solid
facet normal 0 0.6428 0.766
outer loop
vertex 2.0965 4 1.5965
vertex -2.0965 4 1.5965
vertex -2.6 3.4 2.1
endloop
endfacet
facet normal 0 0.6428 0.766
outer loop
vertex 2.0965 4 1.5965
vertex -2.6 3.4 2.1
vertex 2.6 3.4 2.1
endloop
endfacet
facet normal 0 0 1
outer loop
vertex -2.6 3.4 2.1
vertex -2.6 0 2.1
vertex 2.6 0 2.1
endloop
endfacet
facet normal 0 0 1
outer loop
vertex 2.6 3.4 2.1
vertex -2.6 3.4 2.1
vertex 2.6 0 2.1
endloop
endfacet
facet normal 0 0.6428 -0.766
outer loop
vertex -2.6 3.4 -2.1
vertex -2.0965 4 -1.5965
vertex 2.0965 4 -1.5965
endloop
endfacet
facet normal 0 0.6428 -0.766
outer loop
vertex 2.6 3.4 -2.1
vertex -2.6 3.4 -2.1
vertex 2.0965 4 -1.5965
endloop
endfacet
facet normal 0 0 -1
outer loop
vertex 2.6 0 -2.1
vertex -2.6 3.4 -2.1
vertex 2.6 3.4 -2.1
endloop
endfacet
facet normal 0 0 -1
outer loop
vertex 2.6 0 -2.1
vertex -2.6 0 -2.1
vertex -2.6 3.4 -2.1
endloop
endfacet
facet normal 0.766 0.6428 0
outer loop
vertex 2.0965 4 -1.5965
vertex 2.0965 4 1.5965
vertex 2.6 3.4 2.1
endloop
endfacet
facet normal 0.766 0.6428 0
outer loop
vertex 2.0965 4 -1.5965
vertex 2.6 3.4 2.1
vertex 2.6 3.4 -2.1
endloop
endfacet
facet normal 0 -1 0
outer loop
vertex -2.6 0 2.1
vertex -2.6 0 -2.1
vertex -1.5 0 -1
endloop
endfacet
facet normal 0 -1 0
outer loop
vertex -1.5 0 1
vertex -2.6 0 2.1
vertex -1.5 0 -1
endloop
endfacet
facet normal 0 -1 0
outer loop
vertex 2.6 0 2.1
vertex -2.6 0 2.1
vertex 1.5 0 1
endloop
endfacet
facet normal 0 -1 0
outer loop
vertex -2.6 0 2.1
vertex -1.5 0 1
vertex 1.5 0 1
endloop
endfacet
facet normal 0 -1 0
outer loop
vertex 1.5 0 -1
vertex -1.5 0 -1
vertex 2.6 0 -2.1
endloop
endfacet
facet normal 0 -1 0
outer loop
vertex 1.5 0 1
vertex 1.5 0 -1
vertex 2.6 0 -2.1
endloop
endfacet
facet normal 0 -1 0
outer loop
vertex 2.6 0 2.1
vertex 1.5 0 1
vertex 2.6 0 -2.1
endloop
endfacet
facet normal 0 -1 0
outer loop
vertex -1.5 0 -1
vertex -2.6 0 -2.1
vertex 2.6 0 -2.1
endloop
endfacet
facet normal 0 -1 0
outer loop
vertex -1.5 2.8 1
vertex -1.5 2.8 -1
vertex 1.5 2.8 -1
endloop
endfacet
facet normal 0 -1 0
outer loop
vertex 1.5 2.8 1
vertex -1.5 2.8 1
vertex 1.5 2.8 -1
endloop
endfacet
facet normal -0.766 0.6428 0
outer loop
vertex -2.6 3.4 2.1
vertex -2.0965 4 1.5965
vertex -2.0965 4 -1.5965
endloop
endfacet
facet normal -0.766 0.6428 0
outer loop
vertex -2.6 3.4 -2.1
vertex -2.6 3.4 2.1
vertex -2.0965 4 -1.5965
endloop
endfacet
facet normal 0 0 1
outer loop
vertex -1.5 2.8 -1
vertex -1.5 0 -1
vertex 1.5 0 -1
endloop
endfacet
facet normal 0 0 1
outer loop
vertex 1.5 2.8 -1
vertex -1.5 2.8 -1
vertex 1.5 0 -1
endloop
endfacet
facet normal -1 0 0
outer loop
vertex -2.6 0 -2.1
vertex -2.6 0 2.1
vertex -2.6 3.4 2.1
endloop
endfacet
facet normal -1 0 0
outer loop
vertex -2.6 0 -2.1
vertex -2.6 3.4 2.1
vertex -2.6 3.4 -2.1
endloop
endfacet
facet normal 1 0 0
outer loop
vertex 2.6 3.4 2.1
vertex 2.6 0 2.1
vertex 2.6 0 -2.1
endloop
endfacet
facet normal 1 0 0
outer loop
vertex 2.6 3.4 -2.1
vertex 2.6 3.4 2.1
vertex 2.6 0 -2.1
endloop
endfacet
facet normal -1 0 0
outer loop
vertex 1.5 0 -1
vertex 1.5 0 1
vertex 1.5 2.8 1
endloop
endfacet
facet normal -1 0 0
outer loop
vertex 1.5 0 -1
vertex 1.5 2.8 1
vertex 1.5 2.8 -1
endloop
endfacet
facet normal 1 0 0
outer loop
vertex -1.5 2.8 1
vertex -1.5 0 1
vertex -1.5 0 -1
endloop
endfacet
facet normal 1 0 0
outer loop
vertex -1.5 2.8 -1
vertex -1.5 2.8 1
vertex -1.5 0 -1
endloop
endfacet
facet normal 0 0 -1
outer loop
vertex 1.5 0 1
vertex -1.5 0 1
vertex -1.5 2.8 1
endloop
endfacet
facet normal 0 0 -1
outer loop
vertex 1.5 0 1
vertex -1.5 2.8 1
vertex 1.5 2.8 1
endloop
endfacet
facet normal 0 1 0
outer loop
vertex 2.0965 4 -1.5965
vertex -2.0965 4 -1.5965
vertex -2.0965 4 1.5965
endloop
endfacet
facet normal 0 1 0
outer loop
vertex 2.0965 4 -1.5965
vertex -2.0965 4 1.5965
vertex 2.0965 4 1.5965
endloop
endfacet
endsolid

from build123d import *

# Parameters (mm, degrees)
SKETCH1_W                = 5.2
SKETCH1_H                = 4.2
SKETCH1_W_2              = 3
SKETCH1_H_2              = 2
BODY_EXTRUDE_DEPTH       = 2.8
SKETCH2_W                = 5.2
SKETCH2_H                = 4.2
CAP_EXTRUDE_DEPTH        = 1.2
BED_CHAMFER_SIZE         = 0.6
BED_CHAMFER_SIZE2        = 0.503459779
BED_CHAMFER_PART_2_SIZE  = 0.6
BED_CHAMFER_PART_2_SIZE2 = 0.503459779
BED_CHAMFER_PART_3_SIZE  = 0.6
BED_CHAMFER_PART_3_SIZE2 = 0.503459779
BED_CHAMFER_PART_4_SIZE  = 0.6
BED_CHAMFER_PART_4_SIZE2 = 0.503459779


with BuildPart() as part:
    # Sketch1 → Body Extrude (new body)
    with BuildSketch(Plane(origin=(0, 0, 0), x_dir=(1, 0, 0), z_dir=(0, 1, 0))):
        Rectangle(SKETCH1_W, SKETCH1_H)
        Rectangle(SKETCH1_W_2, SKETCH1_H_2, mode=Mode.SUBTRACT)
    extrude(amount=BODY_EXTRUDE_DEPTH)

    # Sketch2 → Cap Extrude (add)
    with BuildSketch(Plane(origin=(0, 2.8, 0), x_dir=(1, 0, 0), z_dir=(0, 1, 0))):
        Rectangle(SKETCH2_W, SKETCH2_H)
    extrude(amount=CAP_EXTRUDE_DEPTH)

    # Bed Chamfer
    bed_chamfer_edges = [part.edges().sort_by_distance(p)[0] for p in [
        (-2.6, 4, 0),
    ]]
    bed_chamfer_side = [part.faces().sort_by_distance(p)[0] for p in [
        (-2.6, 2, 0),
    ]]
    chamfer(bed_chamfer_edges, length=BED_CHAMFER_SIZE, length2=BED_CHAMFER_SIZE2, reference=bed_chamfer_side[0])

    # Bed Chamfer part 2
    bed_chamfer_part_2_edges = [part.edges().sort_by_distance(p)[0] for p in [
        (0, 4, 2.1),
    ]]
    bed_chamfer_part_2_side = [part.faces().sort_by_distance(p)[0] for p in [
        (0, 2, 2.1),
    ]]
    chamfer(bed_chamfer_part_2_edges, length=BED_CHAMFER_PART_2_SIZE, length2=BED_CHAMFER_PART_2_SIZE2, reference=bed_chamfer_part_2_side[0])

    # Bed Chamfer part 3
    bed_chamfer_part_3_edges = [part.edges().sort_by_distance(p)[0] for p in [
        (2.6, 4, 0),
    ]]
    bed_chamfer_part_3_side = [part.faces().sort_by_distance(p)[0] for p in [
        (2.6, 2, 0),
    ]]
    chamfer(bed_chamfer_part_3_edges, length=BED_CHAMFER_PART_3_SIZE, length2=BED_CHAMFER_PART_3_SIZE2, reference=bed_chamfer_part_3_side[0])

    # Bed Chamfer part 4
    bed_chamfer_part_4_edges = [part.edges().sort_by_distance(p)[0] for p in [
        (0, 4, -2.1),
    ]]
    bed_chamfer_part_4_side = [part.faces().sort_by_distance(p)[0] for p in [
        (0, 2, -2.1),
    ]]
    chamfer(bed_chamfer_part_4_edges, length=BED_CHAMFER_PART_4_SIZE, length2=BED_CHAMFER_PART_4_SIZE2, reference=bed_chamfer_part_4_side[0])


solid = part.part
